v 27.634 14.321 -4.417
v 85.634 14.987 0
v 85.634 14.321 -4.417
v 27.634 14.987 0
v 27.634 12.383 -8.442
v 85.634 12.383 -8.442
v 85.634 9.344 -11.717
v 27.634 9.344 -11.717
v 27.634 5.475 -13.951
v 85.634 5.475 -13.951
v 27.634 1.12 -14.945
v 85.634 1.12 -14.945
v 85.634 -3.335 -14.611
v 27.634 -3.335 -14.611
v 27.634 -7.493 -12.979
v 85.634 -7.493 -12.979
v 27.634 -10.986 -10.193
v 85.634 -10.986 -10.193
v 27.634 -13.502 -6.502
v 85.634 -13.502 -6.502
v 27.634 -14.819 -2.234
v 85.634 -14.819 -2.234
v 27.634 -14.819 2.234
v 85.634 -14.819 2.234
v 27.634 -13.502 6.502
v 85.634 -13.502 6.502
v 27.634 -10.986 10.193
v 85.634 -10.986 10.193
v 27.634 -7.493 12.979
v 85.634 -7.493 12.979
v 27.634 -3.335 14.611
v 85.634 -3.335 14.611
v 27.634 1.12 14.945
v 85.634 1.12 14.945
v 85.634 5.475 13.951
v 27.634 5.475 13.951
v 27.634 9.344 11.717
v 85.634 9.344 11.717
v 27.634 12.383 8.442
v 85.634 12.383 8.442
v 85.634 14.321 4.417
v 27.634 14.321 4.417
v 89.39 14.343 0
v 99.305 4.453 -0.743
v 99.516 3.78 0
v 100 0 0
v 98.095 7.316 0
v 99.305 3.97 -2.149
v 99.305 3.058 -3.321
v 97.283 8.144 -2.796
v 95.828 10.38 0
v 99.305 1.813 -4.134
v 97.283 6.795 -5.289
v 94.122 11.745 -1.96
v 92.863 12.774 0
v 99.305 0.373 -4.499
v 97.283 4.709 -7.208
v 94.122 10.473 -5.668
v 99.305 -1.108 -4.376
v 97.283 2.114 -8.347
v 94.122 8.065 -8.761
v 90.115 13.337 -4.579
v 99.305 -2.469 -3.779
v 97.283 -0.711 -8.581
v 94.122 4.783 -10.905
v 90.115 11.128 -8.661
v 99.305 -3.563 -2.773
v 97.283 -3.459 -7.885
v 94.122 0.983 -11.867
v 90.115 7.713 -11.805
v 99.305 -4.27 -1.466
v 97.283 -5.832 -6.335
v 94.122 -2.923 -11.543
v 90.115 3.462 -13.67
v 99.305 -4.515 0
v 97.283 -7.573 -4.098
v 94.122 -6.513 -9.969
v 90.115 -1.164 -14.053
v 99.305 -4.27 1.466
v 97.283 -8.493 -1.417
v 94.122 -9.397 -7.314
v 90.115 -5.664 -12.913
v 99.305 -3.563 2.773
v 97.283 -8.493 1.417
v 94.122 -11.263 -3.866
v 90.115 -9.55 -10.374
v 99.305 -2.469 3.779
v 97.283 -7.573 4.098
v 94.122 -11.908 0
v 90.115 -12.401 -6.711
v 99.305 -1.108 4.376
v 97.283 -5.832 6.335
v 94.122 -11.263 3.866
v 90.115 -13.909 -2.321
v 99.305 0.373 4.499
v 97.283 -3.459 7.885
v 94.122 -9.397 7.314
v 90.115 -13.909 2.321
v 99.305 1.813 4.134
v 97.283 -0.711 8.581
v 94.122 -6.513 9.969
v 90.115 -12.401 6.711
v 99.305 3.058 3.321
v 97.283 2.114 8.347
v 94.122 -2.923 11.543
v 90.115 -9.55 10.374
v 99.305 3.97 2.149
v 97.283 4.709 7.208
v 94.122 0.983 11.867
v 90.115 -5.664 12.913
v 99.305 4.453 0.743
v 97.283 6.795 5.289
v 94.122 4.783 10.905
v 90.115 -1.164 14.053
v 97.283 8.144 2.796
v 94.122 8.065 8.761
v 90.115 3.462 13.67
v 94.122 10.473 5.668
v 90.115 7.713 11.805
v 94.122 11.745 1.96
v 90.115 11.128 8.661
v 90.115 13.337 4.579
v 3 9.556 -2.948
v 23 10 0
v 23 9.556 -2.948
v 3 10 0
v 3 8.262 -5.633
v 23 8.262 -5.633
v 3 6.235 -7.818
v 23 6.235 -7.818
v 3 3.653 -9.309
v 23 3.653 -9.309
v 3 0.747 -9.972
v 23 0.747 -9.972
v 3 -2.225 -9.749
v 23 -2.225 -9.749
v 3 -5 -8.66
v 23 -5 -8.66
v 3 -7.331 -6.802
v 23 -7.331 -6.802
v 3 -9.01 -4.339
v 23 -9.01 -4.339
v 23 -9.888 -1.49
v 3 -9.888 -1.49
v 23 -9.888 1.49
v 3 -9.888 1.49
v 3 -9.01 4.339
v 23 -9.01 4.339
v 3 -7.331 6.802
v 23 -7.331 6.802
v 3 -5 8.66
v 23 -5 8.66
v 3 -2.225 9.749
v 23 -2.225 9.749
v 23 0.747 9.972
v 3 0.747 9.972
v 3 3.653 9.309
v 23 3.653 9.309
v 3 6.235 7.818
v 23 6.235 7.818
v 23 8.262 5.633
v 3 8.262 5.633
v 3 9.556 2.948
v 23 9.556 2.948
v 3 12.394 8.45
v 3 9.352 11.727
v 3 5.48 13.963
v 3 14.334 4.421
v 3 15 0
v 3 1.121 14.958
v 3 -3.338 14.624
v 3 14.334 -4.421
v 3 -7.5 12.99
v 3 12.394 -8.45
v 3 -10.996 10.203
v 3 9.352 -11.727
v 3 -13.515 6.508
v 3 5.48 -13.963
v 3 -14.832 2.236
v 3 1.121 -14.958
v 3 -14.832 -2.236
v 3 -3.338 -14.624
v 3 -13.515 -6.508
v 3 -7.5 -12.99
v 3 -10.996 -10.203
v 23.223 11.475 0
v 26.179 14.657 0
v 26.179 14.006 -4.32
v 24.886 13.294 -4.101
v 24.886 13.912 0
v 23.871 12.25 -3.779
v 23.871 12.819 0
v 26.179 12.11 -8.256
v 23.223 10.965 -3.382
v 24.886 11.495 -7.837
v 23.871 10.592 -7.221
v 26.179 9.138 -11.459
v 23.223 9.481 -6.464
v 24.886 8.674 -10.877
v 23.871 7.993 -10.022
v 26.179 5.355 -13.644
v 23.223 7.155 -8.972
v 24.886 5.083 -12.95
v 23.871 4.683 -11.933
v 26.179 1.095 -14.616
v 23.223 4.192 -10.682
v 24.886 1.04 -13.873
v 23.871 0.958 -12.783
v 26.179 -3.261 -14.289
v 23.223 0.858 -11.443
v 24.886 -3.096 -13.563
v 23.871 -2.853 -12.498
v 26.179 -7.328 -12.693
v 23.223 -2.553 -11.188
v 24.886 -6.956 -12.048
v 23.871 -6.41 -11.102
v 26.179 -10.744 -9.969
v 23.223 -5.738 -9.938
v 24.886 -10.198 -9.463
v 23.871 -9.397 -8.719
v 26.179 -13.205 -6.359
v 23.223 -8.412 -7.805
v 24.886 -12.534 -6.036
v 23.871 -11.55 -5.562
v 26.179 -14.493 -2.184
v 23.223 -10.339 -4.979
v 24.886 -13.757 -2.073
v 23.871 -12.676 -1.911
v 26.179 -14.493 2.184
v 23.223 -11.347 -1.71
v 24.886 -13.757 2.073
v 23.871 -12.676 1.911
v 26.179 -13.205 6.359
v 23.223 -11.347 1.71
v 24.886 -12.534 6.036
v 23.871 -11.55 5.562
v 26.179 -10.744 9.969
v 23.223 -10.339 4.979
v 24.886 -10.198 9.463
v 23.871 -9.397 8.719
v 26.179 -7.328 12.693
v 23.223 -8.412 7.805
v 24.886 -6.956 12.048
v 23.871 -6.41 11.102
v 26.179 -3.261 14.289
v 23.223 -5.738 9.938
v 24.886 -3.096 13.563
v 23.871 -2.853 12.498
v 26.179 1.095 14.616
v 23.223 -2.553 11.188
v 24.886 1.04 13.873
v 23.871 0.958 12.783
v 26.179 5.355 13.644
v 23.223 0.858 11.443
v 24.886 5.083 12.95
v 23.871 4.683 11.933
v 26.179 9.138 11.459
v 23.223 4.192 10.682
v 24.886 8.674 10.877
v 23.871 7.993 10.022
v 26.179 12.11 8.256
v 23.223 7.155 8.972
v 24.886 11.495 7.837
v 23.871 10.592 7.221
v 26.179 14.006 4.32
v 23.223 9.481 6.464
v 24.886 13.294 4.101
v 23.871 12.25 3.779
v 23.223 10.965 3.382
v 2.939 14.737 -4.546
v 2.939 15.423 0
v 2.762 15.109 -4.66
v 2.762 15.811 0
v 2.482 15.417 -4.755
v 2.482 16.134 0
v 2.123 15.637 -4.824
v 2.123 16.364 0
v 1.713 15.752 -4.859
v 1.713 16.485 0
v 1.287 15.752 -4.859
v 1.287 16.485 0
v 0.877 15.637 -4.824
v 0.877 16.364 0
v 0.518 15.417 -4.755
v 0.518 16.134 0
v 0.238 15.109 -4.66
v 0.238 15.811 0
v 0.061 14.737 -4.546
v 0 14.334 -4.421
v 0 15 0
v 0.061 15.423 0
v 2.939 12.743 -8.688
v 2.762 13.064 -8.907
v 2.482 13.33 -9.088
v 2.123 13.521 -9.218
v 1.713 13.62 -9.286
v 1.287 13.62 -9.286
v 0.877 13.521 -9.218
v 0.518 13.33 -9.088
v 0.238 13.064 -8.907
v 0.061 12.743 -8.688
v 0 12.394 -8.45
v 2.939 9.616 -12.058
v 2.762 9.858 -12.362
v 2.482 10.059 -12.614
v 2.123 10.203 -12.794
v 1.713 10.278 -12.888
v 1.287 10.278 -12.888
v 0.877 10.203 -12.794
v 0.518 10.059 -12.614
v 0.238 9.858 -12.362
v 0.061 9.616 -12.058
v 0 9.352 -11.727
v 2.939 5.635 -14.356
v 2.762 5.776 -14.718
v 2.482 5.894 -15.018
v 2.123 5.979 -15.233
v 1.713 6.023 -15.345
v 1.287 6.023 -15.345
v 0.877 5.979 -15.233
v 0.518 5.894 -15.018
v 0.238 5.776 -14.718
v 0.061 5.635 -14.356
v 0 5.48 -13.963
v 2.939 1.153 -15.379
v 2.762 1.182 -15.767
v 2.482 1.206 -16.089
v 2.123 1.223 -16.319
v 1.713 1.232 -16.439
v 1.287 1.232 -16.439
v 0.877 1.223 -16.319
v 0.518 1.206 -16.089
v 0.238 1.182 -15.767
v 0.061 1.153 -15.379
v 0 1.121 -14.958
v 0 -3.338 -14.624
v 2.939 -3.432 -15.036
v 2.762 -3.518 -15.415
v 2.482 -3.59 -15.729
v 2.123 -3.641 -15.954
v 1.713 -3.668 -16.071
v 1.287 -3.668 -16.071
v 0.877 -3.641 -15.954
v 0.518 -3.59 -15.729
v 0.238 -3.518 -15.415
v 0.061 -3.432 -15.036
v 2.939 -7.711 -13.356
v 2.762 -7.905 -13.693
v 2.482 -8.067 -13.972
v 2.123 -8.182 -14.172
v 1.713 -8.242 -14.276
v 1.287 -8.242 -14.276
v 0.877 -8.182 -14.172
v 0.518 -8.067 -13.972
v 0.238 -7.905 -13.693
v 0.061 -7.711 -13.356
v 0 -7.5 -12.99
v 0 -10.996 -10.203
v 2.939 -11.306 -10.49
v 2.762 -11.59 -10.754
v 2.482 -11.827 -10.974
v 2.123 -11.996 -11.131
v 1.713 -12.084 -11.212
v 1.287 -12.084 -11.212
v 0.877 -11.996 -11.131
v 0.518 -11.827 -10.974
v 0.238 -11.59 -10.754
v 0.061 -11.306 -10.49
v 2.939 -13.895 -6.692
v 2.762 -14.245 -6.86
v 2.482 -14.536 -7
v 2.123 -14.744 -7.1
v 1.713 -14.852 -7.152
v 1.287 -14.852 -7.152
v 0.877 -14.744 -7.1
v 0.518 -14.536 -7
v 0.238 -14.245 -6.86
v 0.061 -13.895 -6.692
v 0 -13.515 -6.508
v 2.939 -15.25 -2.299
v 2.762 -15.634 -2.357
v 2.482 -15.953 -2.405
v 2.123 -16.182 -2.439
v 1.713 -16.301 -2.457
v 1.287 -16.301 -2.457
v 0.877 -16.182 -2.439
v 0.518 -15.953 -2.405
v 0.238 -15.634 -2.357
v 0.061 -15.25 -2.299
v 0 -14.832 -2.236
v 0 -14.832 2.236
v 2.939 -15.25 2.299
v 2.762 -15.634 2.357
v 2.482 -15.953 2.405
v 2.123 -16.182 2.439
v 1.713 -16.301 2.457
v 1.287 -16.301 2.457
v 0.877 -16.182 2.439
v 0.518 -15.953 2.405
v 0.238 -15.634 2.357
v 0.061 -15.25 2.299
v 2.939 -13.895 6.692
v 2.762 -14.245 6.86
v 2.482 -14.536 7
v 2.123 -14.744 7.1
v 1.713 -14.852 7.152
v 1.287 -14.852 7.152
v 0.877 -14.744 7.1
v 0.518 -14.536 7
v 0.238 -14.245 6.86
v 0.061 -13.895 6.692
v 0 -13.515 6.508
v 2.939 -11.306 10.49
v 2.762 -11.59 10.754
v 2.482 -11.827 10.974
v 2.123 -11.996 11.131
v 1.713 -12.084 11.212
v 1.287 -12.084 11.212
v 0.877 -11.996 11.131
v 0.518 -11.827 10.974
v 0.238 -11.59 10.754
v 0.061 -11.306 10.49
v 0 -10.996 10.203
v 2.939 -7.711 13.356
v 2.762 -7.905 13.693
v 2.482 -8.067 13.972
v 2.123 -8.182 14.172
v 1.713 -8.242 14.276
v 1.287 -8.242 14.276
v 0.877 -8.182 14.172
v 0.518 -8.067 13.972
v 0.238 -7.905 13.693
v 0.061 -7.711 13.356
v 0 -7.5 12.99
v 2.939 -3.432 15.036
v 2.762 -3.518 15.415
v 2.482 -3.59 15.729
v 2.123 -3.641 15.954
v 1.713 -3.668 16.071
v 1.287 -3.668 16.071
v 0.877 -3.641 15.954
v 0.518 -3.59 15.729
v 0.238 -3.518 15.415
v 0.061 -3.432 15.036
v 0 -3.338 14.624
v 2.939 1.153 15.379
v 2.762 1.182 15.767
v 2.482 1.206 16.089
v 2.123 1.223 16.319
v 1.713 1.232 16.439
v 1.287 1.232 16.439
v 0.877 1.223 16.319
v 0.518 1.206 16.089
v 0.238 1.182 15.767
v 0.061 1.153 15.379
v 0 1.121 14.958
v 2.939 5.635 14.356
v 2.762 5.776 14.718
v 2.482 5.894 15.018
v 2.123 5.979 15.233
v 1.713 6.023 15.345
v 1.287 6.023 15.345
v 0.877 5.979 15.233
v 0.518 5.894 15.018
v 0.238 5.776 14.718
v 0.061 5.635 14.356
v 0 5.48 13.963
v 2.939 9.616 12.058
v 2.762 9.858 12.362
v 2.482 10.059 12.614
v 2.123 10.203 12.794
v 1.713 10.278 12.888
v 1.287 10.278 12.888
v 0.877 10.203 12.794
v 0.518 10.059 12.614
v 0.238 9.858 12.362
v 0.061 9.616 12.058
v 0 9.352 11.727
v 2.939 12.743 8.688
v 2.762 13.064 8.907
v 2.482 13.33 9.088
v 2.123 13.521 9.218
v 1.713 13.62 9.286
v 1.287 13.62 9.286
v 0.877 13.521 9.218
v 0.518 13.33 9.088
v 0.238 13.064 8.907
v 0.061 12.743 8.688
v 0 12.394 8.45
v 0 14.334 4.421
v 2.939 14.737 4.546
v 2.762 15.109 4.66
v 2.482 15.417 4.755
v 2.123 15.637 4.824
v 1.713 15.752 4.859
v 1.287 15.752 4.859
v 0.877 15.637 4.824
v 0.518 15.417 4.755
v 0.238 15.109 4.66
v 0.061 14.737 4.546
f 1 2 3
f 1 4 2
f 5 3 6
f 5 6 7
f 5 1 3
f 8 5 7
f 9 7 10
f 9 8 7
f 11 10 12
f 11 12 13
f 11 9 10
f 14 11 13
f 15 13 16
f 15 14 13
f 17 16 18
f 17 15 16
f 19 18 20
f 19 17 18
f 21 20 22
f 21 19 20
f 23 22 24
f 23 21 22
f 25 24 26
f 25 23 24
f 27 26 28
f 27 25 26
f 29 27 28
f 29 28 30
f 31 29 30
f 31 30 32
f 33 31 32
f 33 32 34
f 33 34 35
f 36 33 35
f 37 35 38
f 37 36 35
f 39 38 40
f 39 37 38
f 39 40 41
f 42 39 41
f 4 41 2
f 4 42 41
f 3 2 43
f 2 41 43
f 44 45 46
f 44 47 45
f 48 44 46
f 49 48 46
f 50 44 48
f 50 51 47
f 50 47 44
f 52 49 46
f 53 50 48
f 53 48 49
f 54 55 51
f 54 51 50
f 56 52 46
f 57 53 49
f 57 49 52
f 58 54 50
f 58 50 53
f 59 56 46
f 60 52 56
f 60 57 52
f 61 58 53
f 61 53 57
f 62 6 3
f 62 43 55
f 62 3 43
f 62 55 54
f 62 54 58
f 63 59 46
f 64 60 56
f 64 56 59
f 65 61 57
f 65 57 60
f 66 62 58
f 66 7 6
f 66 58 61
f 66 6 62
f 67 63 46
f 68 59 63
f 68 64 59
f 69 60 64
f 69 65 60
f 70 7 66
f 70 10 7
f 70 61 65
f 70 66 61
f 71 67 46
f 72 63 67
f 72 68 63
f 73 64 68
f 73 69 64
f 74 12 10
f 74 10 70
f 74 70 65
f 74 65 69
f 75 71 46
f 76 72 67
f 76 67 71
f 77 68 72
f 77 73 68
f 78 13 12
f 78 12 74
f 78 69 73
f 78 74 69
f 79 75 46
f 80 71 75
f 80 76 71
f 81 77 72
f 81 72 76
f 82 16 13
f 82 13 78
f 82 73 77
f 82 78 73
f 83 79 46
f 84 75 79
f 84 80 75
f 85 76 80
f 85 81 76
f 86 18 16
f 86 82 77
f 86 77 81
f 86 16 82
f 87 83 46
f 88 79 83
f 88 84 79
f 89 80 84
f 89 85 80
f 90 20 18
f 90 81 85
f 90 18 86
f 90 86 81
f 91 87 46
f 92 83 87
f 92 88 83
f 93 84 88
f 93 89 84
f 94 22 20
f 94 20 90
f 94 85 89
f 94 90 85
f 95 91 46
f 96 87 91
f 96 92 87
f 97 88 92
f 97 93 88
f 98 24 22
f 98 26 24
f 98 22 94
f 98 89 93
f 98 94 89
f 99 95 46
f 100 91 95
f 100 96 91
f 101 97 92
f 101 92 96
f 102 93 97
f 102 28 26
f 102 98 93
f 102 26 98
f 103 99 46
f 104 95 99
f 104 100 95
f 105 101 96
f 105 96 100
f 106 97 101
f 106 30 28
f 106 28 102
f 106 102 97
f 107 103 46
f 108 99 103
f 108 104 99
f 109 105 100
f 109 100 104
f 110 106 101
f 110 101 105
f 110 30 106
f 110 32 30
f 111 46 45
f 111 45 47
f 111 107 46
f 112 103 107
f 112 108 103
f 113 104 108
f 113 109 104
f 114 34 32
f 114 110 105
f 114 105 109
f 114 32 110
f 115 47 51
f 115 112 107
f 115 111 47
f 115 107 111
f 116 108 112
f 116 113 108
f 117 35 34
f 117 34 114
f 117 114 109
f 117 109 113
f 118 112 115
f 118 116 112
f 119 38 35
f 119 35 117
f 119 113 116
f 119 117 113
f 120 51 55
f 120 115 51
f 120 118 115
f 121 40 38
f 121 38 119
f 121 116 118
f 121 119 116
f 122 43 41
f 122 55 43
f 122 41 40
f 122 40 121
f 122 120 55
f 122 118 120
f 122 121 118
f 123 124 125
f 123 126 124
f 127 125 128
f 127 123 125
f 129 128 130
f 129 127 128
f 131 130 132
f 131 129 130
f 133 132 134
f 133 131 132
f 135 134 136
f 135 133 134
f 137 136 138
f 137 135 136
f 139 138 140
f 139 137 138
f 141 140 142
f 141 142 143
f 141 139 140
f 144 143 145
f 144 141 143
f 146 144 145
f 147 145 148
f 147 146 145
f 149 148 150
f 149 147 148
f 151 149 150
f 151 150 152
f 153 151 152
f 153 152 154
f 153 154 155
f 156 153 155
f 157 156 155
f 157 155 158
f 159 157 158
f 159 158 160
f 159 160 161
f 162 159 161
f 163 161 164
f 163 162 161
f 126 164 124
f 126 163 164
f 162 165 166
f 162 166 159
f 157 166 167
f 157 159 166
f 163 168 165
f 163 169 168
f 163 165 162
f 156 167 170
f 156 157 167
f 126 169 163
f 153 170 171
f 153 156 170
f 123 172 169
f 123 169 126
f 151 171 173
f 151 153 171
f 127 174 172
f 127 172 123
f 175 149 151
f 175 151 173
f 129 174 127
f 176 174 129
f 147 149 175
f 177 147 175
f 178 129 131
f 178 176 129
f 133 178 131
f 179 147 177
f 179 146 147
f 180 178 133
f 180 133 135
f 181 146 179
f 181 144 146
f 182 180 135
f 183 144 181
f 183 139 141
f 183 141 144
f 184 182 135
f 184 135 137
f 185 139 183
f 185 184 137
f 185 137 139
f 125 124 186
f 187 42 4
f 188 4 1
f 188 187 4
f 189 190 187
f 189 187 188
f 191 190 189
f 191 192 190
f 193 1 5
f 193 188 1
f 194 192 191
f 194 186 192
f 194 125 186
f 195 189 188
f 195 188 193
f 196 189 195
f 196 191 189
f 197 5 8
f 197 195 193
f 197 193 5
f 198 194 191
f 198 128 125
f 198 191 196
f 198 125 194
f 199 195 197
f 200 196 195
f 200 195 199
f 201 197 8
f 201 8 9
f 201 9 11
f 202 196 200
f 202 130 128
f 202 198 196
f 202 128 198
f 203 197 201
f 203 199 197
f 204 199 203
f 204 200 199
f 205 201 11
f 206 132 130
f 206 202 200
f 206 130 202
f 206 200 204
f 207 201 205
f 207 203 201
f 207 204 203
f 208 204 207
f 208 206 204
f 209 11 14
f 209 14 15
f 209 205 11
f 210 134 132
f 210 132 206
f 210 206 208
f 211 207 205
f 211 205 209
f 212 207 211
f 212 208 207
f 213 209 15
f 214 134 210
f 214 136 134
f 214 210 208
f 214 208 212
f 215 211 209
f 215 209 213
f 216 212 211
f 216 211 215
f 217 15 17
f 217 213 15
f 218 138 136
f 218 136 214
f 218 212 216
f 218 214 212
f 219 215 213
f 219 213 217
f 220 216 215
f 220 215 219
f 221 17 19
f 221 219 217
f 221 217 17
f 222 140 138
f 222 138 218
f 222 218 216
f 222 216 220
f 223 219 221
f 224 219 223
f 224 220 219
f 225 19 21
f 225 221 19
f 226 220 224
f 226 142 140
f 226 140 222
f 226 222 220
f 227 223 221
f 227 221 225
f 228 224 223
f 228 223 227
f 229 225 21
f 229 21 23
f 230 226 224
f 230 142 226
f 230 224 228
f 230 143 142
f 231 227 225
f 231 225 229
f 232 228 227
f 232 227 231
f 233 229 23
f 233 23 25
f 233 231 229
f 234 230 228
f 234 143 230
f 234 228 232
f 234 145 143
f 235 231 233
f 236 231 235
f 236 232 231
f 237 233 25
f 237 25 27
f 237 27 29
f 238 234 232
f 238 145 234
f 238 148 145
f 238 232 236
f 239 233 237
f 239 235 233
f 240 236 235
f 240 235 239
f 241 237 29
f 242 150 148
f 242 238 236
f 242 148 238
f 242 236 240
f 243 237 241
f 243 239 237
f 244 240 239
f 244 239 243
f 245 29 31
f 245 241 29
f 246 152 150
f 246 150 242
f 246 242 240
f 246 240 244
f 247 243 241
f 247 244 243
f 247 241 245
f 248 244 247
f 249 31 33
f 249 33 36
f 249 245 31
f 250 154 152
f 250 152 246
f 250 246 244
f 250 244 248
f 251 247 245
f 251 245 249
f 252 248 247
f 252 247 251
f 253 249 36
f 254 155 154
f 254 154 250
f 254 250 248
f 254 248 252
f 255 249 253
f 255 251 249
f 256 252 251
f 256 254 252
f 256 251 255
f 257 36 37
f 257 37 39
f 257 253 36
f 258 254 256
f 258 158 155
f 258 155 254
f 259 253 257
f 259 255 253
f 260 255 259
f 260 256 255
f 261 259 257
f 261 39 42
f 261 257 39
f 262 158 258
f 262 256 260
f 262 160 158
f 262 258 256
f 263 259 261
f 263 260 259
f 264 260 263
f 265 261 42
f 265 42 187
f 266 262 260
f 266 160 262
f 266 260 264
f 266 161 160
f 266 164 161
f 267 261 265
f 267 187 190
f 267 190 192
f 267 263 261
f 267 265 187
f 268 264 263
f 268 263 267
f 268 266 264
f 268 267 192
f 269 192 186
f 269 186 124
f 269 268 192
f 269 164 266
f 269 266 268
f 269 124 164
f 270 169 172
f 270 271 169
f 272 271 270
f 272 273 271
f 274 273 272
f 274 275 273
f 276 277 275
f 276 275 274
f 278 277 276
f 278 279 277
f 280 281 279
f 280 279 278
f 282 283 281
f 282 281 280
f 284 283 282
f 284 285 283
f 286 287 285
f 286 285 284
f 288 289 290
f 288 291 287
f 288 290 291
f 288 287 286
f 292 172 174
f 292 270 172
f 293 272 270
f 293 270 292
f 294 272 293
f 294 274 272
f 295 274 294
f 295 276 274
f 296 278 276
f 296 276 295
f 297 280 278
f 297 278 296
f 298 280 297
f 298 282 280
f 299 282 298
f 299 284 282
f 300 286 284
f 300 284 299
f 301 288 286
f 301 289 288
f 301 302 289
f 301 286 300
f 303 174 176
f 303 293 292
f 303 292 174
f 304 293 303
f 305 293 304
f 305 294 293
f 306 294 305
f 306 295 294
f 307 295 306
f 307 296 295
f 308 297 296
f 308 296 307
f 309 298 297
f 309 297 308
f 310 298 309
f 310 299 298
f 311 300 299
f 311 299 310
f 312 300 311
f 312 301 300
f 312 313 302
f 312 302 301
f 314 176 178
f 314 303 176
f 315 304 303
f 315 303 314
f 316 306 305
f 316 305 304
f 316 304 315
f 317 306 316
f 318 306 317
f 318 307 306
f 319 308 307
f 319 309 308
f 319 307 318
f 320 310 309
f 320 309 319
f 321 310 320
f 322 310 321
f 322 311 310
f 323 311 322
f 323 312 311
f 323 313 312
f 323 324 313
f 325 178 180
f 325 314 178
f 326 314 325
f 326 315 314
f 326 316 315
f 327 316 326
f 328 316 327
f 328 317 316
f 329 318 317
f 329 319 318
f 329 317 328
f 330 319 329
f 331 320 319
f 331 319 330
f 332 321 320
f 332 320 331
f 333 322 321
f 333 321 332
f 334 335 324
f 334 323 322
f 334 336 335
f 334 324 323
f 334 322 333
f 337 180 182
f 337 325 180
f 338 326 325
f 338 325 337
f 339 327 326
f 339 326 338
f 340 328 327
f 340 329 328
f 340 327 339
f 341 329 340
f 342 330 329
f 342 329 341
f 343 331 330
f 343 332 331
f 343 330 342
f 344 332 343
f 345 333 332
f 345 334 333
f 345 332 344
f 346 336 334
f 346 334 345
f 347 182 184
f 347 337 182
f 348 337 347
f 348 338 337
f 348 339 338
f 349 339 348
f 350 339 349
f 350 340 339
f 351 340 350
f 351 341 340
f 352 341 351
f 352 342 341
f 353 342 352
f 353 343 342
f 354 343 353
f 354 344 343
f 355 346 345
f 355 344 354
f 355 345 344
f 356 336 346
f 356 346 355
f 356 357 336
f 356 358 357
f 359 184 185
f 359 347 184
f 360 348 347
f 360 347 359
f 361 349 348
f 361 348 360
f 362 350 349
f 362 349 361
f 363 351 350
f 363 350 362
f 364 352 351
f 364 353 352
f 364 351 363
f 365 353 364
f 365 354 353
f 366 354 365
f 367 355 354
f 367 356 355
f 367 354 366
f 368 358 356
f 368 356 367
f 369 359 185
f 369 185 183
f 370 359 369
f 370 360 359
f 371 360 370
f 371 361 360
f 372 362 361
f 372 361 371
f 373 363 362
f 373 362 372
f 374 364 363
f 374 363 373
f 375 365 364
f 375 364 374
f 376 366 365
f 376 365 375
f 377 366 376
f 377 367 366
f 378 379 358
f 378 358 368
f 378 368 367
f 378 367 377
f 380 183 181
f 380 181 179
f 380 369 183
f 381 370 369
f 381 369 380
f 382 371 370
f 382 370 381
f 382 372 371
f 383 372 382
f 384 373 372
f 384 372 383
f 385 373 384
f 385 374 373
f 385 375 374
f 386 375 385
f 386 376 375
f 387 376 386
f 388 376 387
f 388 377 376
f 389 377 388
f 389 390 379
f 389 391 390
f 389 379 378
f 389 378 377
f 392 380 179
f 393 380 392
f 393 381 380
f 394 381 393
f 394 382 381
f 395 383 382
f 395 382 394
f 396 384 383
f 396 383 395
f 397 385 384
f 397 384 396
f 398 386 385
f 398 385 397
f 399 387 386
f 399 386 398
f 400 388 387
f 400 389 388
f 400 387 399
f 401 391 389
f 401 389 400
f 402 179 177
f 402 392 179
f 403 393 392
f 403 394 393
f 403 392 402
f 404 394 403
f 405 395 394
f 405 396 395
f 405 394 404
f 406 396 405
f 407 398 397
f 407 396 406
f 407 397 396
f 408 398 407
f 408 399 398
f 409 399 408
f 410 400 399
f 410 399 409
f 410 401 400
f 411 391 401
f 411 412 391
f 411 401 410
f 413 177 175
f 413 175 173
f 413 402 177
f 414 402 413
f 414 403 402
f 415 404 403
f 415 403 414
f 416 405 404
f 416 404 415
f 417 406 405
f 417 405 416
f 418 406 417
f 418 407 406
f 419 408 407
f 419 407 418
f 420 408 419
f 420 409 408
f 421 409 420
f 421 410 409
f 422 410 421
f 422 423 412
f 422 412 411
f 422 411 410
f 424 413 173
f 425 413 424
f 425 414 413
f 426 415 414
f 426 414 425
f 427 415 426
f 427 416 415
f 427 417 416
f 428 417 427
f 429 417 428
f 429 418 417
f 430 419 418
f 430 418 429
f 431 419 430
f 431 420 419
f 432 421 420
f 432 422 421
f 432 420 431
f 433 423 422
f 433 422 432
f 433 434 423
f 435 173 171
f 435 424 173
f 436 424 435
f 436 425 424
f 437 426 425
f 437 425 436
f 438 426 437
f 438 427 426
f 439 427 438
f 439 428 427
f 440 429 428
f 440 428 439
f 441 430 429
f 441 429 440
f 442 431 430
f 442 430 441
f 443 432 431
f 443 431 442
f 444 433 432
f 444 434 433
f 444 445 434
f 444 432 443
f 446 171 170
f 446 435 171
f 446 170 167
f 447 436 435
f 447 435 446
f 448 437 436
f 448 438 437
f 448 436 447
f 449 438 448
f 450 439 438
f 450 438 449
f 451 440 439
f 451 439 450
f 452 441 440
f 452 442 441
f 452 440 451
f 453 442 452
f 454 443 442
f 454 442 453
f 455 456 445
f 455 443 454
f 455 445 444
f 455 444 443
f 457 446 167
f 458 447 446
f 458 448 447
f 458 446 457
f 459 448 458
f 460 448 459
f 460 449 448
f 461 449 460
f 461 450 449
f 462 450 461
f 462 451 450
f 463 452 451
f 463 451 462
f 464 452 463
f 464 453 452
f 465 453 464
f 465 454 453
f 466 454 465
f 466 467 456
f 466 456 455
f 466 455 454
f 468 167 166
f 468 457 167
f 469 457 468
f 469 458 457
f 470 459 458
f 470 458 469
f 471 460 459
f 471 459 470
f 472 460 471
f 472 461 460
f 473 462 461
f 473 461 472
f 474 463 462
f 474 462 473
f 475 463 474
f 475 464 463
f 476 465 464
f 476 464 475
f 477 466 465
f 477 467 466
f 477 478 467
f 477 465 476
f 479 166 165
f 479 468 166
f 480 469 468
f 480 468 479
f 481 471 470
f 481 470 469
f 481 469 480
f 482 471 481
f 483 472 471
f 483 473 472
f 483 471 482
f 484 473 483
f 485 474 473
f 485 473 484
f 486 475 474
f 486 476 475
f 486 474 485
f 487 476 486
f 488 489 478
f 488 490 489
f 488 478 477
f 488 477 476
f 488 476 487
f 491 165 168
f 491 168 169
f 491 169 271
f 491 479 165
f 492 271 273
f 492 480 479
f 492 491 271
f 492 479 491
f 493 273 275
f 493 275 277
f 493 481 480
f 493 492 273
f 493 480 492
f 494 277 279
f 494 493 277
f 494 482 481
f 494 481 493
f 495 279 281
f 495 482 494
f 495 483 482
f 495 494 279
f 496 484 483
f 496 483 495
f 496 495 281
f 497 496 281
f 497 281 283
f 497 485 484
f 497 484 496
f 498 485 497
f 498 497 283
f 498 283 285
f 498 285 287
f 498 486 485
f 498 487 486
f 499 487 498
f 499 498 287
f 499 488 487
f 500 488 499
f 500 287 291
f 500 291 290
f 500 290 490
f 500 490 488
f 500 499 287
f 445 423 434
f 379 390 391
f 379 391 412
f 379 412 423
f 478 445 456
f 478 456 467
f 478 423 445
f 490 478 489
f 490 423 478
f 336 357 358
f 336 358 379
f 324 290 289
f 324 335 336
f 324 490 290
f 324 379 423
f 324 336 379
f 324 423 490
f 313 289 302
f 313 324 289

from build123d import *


with BuildPart() as part:
    # Sketch1 → Revolve1 (revolve)
    with BuildSketch(Plane.XY):
        with BuildLine():
            Line((0, 15), (0, 0))
            Line((0, 0), (100, 0))
            ThreePointArc((100, 0), (95.828314101, 10.380154803), (85.633651502, 14.986610216))
            Line((85.633651502, 14.986610216), (27.634324528, 14.986610216))
            ThreePointArc((27.634324528, 14.986610216), (24.337461443, 13.403793666), (23, 10))
            Line((23, 10), (3, 10))
            Line((3, 10), (3, 15))
            ThreePointArc((3, 15), (1.5, 16.5), (0, 15))
        make_face()
    revolve(axis=Axis((100, 0, 0), (-1, 0, 0)))


solid = part.part
